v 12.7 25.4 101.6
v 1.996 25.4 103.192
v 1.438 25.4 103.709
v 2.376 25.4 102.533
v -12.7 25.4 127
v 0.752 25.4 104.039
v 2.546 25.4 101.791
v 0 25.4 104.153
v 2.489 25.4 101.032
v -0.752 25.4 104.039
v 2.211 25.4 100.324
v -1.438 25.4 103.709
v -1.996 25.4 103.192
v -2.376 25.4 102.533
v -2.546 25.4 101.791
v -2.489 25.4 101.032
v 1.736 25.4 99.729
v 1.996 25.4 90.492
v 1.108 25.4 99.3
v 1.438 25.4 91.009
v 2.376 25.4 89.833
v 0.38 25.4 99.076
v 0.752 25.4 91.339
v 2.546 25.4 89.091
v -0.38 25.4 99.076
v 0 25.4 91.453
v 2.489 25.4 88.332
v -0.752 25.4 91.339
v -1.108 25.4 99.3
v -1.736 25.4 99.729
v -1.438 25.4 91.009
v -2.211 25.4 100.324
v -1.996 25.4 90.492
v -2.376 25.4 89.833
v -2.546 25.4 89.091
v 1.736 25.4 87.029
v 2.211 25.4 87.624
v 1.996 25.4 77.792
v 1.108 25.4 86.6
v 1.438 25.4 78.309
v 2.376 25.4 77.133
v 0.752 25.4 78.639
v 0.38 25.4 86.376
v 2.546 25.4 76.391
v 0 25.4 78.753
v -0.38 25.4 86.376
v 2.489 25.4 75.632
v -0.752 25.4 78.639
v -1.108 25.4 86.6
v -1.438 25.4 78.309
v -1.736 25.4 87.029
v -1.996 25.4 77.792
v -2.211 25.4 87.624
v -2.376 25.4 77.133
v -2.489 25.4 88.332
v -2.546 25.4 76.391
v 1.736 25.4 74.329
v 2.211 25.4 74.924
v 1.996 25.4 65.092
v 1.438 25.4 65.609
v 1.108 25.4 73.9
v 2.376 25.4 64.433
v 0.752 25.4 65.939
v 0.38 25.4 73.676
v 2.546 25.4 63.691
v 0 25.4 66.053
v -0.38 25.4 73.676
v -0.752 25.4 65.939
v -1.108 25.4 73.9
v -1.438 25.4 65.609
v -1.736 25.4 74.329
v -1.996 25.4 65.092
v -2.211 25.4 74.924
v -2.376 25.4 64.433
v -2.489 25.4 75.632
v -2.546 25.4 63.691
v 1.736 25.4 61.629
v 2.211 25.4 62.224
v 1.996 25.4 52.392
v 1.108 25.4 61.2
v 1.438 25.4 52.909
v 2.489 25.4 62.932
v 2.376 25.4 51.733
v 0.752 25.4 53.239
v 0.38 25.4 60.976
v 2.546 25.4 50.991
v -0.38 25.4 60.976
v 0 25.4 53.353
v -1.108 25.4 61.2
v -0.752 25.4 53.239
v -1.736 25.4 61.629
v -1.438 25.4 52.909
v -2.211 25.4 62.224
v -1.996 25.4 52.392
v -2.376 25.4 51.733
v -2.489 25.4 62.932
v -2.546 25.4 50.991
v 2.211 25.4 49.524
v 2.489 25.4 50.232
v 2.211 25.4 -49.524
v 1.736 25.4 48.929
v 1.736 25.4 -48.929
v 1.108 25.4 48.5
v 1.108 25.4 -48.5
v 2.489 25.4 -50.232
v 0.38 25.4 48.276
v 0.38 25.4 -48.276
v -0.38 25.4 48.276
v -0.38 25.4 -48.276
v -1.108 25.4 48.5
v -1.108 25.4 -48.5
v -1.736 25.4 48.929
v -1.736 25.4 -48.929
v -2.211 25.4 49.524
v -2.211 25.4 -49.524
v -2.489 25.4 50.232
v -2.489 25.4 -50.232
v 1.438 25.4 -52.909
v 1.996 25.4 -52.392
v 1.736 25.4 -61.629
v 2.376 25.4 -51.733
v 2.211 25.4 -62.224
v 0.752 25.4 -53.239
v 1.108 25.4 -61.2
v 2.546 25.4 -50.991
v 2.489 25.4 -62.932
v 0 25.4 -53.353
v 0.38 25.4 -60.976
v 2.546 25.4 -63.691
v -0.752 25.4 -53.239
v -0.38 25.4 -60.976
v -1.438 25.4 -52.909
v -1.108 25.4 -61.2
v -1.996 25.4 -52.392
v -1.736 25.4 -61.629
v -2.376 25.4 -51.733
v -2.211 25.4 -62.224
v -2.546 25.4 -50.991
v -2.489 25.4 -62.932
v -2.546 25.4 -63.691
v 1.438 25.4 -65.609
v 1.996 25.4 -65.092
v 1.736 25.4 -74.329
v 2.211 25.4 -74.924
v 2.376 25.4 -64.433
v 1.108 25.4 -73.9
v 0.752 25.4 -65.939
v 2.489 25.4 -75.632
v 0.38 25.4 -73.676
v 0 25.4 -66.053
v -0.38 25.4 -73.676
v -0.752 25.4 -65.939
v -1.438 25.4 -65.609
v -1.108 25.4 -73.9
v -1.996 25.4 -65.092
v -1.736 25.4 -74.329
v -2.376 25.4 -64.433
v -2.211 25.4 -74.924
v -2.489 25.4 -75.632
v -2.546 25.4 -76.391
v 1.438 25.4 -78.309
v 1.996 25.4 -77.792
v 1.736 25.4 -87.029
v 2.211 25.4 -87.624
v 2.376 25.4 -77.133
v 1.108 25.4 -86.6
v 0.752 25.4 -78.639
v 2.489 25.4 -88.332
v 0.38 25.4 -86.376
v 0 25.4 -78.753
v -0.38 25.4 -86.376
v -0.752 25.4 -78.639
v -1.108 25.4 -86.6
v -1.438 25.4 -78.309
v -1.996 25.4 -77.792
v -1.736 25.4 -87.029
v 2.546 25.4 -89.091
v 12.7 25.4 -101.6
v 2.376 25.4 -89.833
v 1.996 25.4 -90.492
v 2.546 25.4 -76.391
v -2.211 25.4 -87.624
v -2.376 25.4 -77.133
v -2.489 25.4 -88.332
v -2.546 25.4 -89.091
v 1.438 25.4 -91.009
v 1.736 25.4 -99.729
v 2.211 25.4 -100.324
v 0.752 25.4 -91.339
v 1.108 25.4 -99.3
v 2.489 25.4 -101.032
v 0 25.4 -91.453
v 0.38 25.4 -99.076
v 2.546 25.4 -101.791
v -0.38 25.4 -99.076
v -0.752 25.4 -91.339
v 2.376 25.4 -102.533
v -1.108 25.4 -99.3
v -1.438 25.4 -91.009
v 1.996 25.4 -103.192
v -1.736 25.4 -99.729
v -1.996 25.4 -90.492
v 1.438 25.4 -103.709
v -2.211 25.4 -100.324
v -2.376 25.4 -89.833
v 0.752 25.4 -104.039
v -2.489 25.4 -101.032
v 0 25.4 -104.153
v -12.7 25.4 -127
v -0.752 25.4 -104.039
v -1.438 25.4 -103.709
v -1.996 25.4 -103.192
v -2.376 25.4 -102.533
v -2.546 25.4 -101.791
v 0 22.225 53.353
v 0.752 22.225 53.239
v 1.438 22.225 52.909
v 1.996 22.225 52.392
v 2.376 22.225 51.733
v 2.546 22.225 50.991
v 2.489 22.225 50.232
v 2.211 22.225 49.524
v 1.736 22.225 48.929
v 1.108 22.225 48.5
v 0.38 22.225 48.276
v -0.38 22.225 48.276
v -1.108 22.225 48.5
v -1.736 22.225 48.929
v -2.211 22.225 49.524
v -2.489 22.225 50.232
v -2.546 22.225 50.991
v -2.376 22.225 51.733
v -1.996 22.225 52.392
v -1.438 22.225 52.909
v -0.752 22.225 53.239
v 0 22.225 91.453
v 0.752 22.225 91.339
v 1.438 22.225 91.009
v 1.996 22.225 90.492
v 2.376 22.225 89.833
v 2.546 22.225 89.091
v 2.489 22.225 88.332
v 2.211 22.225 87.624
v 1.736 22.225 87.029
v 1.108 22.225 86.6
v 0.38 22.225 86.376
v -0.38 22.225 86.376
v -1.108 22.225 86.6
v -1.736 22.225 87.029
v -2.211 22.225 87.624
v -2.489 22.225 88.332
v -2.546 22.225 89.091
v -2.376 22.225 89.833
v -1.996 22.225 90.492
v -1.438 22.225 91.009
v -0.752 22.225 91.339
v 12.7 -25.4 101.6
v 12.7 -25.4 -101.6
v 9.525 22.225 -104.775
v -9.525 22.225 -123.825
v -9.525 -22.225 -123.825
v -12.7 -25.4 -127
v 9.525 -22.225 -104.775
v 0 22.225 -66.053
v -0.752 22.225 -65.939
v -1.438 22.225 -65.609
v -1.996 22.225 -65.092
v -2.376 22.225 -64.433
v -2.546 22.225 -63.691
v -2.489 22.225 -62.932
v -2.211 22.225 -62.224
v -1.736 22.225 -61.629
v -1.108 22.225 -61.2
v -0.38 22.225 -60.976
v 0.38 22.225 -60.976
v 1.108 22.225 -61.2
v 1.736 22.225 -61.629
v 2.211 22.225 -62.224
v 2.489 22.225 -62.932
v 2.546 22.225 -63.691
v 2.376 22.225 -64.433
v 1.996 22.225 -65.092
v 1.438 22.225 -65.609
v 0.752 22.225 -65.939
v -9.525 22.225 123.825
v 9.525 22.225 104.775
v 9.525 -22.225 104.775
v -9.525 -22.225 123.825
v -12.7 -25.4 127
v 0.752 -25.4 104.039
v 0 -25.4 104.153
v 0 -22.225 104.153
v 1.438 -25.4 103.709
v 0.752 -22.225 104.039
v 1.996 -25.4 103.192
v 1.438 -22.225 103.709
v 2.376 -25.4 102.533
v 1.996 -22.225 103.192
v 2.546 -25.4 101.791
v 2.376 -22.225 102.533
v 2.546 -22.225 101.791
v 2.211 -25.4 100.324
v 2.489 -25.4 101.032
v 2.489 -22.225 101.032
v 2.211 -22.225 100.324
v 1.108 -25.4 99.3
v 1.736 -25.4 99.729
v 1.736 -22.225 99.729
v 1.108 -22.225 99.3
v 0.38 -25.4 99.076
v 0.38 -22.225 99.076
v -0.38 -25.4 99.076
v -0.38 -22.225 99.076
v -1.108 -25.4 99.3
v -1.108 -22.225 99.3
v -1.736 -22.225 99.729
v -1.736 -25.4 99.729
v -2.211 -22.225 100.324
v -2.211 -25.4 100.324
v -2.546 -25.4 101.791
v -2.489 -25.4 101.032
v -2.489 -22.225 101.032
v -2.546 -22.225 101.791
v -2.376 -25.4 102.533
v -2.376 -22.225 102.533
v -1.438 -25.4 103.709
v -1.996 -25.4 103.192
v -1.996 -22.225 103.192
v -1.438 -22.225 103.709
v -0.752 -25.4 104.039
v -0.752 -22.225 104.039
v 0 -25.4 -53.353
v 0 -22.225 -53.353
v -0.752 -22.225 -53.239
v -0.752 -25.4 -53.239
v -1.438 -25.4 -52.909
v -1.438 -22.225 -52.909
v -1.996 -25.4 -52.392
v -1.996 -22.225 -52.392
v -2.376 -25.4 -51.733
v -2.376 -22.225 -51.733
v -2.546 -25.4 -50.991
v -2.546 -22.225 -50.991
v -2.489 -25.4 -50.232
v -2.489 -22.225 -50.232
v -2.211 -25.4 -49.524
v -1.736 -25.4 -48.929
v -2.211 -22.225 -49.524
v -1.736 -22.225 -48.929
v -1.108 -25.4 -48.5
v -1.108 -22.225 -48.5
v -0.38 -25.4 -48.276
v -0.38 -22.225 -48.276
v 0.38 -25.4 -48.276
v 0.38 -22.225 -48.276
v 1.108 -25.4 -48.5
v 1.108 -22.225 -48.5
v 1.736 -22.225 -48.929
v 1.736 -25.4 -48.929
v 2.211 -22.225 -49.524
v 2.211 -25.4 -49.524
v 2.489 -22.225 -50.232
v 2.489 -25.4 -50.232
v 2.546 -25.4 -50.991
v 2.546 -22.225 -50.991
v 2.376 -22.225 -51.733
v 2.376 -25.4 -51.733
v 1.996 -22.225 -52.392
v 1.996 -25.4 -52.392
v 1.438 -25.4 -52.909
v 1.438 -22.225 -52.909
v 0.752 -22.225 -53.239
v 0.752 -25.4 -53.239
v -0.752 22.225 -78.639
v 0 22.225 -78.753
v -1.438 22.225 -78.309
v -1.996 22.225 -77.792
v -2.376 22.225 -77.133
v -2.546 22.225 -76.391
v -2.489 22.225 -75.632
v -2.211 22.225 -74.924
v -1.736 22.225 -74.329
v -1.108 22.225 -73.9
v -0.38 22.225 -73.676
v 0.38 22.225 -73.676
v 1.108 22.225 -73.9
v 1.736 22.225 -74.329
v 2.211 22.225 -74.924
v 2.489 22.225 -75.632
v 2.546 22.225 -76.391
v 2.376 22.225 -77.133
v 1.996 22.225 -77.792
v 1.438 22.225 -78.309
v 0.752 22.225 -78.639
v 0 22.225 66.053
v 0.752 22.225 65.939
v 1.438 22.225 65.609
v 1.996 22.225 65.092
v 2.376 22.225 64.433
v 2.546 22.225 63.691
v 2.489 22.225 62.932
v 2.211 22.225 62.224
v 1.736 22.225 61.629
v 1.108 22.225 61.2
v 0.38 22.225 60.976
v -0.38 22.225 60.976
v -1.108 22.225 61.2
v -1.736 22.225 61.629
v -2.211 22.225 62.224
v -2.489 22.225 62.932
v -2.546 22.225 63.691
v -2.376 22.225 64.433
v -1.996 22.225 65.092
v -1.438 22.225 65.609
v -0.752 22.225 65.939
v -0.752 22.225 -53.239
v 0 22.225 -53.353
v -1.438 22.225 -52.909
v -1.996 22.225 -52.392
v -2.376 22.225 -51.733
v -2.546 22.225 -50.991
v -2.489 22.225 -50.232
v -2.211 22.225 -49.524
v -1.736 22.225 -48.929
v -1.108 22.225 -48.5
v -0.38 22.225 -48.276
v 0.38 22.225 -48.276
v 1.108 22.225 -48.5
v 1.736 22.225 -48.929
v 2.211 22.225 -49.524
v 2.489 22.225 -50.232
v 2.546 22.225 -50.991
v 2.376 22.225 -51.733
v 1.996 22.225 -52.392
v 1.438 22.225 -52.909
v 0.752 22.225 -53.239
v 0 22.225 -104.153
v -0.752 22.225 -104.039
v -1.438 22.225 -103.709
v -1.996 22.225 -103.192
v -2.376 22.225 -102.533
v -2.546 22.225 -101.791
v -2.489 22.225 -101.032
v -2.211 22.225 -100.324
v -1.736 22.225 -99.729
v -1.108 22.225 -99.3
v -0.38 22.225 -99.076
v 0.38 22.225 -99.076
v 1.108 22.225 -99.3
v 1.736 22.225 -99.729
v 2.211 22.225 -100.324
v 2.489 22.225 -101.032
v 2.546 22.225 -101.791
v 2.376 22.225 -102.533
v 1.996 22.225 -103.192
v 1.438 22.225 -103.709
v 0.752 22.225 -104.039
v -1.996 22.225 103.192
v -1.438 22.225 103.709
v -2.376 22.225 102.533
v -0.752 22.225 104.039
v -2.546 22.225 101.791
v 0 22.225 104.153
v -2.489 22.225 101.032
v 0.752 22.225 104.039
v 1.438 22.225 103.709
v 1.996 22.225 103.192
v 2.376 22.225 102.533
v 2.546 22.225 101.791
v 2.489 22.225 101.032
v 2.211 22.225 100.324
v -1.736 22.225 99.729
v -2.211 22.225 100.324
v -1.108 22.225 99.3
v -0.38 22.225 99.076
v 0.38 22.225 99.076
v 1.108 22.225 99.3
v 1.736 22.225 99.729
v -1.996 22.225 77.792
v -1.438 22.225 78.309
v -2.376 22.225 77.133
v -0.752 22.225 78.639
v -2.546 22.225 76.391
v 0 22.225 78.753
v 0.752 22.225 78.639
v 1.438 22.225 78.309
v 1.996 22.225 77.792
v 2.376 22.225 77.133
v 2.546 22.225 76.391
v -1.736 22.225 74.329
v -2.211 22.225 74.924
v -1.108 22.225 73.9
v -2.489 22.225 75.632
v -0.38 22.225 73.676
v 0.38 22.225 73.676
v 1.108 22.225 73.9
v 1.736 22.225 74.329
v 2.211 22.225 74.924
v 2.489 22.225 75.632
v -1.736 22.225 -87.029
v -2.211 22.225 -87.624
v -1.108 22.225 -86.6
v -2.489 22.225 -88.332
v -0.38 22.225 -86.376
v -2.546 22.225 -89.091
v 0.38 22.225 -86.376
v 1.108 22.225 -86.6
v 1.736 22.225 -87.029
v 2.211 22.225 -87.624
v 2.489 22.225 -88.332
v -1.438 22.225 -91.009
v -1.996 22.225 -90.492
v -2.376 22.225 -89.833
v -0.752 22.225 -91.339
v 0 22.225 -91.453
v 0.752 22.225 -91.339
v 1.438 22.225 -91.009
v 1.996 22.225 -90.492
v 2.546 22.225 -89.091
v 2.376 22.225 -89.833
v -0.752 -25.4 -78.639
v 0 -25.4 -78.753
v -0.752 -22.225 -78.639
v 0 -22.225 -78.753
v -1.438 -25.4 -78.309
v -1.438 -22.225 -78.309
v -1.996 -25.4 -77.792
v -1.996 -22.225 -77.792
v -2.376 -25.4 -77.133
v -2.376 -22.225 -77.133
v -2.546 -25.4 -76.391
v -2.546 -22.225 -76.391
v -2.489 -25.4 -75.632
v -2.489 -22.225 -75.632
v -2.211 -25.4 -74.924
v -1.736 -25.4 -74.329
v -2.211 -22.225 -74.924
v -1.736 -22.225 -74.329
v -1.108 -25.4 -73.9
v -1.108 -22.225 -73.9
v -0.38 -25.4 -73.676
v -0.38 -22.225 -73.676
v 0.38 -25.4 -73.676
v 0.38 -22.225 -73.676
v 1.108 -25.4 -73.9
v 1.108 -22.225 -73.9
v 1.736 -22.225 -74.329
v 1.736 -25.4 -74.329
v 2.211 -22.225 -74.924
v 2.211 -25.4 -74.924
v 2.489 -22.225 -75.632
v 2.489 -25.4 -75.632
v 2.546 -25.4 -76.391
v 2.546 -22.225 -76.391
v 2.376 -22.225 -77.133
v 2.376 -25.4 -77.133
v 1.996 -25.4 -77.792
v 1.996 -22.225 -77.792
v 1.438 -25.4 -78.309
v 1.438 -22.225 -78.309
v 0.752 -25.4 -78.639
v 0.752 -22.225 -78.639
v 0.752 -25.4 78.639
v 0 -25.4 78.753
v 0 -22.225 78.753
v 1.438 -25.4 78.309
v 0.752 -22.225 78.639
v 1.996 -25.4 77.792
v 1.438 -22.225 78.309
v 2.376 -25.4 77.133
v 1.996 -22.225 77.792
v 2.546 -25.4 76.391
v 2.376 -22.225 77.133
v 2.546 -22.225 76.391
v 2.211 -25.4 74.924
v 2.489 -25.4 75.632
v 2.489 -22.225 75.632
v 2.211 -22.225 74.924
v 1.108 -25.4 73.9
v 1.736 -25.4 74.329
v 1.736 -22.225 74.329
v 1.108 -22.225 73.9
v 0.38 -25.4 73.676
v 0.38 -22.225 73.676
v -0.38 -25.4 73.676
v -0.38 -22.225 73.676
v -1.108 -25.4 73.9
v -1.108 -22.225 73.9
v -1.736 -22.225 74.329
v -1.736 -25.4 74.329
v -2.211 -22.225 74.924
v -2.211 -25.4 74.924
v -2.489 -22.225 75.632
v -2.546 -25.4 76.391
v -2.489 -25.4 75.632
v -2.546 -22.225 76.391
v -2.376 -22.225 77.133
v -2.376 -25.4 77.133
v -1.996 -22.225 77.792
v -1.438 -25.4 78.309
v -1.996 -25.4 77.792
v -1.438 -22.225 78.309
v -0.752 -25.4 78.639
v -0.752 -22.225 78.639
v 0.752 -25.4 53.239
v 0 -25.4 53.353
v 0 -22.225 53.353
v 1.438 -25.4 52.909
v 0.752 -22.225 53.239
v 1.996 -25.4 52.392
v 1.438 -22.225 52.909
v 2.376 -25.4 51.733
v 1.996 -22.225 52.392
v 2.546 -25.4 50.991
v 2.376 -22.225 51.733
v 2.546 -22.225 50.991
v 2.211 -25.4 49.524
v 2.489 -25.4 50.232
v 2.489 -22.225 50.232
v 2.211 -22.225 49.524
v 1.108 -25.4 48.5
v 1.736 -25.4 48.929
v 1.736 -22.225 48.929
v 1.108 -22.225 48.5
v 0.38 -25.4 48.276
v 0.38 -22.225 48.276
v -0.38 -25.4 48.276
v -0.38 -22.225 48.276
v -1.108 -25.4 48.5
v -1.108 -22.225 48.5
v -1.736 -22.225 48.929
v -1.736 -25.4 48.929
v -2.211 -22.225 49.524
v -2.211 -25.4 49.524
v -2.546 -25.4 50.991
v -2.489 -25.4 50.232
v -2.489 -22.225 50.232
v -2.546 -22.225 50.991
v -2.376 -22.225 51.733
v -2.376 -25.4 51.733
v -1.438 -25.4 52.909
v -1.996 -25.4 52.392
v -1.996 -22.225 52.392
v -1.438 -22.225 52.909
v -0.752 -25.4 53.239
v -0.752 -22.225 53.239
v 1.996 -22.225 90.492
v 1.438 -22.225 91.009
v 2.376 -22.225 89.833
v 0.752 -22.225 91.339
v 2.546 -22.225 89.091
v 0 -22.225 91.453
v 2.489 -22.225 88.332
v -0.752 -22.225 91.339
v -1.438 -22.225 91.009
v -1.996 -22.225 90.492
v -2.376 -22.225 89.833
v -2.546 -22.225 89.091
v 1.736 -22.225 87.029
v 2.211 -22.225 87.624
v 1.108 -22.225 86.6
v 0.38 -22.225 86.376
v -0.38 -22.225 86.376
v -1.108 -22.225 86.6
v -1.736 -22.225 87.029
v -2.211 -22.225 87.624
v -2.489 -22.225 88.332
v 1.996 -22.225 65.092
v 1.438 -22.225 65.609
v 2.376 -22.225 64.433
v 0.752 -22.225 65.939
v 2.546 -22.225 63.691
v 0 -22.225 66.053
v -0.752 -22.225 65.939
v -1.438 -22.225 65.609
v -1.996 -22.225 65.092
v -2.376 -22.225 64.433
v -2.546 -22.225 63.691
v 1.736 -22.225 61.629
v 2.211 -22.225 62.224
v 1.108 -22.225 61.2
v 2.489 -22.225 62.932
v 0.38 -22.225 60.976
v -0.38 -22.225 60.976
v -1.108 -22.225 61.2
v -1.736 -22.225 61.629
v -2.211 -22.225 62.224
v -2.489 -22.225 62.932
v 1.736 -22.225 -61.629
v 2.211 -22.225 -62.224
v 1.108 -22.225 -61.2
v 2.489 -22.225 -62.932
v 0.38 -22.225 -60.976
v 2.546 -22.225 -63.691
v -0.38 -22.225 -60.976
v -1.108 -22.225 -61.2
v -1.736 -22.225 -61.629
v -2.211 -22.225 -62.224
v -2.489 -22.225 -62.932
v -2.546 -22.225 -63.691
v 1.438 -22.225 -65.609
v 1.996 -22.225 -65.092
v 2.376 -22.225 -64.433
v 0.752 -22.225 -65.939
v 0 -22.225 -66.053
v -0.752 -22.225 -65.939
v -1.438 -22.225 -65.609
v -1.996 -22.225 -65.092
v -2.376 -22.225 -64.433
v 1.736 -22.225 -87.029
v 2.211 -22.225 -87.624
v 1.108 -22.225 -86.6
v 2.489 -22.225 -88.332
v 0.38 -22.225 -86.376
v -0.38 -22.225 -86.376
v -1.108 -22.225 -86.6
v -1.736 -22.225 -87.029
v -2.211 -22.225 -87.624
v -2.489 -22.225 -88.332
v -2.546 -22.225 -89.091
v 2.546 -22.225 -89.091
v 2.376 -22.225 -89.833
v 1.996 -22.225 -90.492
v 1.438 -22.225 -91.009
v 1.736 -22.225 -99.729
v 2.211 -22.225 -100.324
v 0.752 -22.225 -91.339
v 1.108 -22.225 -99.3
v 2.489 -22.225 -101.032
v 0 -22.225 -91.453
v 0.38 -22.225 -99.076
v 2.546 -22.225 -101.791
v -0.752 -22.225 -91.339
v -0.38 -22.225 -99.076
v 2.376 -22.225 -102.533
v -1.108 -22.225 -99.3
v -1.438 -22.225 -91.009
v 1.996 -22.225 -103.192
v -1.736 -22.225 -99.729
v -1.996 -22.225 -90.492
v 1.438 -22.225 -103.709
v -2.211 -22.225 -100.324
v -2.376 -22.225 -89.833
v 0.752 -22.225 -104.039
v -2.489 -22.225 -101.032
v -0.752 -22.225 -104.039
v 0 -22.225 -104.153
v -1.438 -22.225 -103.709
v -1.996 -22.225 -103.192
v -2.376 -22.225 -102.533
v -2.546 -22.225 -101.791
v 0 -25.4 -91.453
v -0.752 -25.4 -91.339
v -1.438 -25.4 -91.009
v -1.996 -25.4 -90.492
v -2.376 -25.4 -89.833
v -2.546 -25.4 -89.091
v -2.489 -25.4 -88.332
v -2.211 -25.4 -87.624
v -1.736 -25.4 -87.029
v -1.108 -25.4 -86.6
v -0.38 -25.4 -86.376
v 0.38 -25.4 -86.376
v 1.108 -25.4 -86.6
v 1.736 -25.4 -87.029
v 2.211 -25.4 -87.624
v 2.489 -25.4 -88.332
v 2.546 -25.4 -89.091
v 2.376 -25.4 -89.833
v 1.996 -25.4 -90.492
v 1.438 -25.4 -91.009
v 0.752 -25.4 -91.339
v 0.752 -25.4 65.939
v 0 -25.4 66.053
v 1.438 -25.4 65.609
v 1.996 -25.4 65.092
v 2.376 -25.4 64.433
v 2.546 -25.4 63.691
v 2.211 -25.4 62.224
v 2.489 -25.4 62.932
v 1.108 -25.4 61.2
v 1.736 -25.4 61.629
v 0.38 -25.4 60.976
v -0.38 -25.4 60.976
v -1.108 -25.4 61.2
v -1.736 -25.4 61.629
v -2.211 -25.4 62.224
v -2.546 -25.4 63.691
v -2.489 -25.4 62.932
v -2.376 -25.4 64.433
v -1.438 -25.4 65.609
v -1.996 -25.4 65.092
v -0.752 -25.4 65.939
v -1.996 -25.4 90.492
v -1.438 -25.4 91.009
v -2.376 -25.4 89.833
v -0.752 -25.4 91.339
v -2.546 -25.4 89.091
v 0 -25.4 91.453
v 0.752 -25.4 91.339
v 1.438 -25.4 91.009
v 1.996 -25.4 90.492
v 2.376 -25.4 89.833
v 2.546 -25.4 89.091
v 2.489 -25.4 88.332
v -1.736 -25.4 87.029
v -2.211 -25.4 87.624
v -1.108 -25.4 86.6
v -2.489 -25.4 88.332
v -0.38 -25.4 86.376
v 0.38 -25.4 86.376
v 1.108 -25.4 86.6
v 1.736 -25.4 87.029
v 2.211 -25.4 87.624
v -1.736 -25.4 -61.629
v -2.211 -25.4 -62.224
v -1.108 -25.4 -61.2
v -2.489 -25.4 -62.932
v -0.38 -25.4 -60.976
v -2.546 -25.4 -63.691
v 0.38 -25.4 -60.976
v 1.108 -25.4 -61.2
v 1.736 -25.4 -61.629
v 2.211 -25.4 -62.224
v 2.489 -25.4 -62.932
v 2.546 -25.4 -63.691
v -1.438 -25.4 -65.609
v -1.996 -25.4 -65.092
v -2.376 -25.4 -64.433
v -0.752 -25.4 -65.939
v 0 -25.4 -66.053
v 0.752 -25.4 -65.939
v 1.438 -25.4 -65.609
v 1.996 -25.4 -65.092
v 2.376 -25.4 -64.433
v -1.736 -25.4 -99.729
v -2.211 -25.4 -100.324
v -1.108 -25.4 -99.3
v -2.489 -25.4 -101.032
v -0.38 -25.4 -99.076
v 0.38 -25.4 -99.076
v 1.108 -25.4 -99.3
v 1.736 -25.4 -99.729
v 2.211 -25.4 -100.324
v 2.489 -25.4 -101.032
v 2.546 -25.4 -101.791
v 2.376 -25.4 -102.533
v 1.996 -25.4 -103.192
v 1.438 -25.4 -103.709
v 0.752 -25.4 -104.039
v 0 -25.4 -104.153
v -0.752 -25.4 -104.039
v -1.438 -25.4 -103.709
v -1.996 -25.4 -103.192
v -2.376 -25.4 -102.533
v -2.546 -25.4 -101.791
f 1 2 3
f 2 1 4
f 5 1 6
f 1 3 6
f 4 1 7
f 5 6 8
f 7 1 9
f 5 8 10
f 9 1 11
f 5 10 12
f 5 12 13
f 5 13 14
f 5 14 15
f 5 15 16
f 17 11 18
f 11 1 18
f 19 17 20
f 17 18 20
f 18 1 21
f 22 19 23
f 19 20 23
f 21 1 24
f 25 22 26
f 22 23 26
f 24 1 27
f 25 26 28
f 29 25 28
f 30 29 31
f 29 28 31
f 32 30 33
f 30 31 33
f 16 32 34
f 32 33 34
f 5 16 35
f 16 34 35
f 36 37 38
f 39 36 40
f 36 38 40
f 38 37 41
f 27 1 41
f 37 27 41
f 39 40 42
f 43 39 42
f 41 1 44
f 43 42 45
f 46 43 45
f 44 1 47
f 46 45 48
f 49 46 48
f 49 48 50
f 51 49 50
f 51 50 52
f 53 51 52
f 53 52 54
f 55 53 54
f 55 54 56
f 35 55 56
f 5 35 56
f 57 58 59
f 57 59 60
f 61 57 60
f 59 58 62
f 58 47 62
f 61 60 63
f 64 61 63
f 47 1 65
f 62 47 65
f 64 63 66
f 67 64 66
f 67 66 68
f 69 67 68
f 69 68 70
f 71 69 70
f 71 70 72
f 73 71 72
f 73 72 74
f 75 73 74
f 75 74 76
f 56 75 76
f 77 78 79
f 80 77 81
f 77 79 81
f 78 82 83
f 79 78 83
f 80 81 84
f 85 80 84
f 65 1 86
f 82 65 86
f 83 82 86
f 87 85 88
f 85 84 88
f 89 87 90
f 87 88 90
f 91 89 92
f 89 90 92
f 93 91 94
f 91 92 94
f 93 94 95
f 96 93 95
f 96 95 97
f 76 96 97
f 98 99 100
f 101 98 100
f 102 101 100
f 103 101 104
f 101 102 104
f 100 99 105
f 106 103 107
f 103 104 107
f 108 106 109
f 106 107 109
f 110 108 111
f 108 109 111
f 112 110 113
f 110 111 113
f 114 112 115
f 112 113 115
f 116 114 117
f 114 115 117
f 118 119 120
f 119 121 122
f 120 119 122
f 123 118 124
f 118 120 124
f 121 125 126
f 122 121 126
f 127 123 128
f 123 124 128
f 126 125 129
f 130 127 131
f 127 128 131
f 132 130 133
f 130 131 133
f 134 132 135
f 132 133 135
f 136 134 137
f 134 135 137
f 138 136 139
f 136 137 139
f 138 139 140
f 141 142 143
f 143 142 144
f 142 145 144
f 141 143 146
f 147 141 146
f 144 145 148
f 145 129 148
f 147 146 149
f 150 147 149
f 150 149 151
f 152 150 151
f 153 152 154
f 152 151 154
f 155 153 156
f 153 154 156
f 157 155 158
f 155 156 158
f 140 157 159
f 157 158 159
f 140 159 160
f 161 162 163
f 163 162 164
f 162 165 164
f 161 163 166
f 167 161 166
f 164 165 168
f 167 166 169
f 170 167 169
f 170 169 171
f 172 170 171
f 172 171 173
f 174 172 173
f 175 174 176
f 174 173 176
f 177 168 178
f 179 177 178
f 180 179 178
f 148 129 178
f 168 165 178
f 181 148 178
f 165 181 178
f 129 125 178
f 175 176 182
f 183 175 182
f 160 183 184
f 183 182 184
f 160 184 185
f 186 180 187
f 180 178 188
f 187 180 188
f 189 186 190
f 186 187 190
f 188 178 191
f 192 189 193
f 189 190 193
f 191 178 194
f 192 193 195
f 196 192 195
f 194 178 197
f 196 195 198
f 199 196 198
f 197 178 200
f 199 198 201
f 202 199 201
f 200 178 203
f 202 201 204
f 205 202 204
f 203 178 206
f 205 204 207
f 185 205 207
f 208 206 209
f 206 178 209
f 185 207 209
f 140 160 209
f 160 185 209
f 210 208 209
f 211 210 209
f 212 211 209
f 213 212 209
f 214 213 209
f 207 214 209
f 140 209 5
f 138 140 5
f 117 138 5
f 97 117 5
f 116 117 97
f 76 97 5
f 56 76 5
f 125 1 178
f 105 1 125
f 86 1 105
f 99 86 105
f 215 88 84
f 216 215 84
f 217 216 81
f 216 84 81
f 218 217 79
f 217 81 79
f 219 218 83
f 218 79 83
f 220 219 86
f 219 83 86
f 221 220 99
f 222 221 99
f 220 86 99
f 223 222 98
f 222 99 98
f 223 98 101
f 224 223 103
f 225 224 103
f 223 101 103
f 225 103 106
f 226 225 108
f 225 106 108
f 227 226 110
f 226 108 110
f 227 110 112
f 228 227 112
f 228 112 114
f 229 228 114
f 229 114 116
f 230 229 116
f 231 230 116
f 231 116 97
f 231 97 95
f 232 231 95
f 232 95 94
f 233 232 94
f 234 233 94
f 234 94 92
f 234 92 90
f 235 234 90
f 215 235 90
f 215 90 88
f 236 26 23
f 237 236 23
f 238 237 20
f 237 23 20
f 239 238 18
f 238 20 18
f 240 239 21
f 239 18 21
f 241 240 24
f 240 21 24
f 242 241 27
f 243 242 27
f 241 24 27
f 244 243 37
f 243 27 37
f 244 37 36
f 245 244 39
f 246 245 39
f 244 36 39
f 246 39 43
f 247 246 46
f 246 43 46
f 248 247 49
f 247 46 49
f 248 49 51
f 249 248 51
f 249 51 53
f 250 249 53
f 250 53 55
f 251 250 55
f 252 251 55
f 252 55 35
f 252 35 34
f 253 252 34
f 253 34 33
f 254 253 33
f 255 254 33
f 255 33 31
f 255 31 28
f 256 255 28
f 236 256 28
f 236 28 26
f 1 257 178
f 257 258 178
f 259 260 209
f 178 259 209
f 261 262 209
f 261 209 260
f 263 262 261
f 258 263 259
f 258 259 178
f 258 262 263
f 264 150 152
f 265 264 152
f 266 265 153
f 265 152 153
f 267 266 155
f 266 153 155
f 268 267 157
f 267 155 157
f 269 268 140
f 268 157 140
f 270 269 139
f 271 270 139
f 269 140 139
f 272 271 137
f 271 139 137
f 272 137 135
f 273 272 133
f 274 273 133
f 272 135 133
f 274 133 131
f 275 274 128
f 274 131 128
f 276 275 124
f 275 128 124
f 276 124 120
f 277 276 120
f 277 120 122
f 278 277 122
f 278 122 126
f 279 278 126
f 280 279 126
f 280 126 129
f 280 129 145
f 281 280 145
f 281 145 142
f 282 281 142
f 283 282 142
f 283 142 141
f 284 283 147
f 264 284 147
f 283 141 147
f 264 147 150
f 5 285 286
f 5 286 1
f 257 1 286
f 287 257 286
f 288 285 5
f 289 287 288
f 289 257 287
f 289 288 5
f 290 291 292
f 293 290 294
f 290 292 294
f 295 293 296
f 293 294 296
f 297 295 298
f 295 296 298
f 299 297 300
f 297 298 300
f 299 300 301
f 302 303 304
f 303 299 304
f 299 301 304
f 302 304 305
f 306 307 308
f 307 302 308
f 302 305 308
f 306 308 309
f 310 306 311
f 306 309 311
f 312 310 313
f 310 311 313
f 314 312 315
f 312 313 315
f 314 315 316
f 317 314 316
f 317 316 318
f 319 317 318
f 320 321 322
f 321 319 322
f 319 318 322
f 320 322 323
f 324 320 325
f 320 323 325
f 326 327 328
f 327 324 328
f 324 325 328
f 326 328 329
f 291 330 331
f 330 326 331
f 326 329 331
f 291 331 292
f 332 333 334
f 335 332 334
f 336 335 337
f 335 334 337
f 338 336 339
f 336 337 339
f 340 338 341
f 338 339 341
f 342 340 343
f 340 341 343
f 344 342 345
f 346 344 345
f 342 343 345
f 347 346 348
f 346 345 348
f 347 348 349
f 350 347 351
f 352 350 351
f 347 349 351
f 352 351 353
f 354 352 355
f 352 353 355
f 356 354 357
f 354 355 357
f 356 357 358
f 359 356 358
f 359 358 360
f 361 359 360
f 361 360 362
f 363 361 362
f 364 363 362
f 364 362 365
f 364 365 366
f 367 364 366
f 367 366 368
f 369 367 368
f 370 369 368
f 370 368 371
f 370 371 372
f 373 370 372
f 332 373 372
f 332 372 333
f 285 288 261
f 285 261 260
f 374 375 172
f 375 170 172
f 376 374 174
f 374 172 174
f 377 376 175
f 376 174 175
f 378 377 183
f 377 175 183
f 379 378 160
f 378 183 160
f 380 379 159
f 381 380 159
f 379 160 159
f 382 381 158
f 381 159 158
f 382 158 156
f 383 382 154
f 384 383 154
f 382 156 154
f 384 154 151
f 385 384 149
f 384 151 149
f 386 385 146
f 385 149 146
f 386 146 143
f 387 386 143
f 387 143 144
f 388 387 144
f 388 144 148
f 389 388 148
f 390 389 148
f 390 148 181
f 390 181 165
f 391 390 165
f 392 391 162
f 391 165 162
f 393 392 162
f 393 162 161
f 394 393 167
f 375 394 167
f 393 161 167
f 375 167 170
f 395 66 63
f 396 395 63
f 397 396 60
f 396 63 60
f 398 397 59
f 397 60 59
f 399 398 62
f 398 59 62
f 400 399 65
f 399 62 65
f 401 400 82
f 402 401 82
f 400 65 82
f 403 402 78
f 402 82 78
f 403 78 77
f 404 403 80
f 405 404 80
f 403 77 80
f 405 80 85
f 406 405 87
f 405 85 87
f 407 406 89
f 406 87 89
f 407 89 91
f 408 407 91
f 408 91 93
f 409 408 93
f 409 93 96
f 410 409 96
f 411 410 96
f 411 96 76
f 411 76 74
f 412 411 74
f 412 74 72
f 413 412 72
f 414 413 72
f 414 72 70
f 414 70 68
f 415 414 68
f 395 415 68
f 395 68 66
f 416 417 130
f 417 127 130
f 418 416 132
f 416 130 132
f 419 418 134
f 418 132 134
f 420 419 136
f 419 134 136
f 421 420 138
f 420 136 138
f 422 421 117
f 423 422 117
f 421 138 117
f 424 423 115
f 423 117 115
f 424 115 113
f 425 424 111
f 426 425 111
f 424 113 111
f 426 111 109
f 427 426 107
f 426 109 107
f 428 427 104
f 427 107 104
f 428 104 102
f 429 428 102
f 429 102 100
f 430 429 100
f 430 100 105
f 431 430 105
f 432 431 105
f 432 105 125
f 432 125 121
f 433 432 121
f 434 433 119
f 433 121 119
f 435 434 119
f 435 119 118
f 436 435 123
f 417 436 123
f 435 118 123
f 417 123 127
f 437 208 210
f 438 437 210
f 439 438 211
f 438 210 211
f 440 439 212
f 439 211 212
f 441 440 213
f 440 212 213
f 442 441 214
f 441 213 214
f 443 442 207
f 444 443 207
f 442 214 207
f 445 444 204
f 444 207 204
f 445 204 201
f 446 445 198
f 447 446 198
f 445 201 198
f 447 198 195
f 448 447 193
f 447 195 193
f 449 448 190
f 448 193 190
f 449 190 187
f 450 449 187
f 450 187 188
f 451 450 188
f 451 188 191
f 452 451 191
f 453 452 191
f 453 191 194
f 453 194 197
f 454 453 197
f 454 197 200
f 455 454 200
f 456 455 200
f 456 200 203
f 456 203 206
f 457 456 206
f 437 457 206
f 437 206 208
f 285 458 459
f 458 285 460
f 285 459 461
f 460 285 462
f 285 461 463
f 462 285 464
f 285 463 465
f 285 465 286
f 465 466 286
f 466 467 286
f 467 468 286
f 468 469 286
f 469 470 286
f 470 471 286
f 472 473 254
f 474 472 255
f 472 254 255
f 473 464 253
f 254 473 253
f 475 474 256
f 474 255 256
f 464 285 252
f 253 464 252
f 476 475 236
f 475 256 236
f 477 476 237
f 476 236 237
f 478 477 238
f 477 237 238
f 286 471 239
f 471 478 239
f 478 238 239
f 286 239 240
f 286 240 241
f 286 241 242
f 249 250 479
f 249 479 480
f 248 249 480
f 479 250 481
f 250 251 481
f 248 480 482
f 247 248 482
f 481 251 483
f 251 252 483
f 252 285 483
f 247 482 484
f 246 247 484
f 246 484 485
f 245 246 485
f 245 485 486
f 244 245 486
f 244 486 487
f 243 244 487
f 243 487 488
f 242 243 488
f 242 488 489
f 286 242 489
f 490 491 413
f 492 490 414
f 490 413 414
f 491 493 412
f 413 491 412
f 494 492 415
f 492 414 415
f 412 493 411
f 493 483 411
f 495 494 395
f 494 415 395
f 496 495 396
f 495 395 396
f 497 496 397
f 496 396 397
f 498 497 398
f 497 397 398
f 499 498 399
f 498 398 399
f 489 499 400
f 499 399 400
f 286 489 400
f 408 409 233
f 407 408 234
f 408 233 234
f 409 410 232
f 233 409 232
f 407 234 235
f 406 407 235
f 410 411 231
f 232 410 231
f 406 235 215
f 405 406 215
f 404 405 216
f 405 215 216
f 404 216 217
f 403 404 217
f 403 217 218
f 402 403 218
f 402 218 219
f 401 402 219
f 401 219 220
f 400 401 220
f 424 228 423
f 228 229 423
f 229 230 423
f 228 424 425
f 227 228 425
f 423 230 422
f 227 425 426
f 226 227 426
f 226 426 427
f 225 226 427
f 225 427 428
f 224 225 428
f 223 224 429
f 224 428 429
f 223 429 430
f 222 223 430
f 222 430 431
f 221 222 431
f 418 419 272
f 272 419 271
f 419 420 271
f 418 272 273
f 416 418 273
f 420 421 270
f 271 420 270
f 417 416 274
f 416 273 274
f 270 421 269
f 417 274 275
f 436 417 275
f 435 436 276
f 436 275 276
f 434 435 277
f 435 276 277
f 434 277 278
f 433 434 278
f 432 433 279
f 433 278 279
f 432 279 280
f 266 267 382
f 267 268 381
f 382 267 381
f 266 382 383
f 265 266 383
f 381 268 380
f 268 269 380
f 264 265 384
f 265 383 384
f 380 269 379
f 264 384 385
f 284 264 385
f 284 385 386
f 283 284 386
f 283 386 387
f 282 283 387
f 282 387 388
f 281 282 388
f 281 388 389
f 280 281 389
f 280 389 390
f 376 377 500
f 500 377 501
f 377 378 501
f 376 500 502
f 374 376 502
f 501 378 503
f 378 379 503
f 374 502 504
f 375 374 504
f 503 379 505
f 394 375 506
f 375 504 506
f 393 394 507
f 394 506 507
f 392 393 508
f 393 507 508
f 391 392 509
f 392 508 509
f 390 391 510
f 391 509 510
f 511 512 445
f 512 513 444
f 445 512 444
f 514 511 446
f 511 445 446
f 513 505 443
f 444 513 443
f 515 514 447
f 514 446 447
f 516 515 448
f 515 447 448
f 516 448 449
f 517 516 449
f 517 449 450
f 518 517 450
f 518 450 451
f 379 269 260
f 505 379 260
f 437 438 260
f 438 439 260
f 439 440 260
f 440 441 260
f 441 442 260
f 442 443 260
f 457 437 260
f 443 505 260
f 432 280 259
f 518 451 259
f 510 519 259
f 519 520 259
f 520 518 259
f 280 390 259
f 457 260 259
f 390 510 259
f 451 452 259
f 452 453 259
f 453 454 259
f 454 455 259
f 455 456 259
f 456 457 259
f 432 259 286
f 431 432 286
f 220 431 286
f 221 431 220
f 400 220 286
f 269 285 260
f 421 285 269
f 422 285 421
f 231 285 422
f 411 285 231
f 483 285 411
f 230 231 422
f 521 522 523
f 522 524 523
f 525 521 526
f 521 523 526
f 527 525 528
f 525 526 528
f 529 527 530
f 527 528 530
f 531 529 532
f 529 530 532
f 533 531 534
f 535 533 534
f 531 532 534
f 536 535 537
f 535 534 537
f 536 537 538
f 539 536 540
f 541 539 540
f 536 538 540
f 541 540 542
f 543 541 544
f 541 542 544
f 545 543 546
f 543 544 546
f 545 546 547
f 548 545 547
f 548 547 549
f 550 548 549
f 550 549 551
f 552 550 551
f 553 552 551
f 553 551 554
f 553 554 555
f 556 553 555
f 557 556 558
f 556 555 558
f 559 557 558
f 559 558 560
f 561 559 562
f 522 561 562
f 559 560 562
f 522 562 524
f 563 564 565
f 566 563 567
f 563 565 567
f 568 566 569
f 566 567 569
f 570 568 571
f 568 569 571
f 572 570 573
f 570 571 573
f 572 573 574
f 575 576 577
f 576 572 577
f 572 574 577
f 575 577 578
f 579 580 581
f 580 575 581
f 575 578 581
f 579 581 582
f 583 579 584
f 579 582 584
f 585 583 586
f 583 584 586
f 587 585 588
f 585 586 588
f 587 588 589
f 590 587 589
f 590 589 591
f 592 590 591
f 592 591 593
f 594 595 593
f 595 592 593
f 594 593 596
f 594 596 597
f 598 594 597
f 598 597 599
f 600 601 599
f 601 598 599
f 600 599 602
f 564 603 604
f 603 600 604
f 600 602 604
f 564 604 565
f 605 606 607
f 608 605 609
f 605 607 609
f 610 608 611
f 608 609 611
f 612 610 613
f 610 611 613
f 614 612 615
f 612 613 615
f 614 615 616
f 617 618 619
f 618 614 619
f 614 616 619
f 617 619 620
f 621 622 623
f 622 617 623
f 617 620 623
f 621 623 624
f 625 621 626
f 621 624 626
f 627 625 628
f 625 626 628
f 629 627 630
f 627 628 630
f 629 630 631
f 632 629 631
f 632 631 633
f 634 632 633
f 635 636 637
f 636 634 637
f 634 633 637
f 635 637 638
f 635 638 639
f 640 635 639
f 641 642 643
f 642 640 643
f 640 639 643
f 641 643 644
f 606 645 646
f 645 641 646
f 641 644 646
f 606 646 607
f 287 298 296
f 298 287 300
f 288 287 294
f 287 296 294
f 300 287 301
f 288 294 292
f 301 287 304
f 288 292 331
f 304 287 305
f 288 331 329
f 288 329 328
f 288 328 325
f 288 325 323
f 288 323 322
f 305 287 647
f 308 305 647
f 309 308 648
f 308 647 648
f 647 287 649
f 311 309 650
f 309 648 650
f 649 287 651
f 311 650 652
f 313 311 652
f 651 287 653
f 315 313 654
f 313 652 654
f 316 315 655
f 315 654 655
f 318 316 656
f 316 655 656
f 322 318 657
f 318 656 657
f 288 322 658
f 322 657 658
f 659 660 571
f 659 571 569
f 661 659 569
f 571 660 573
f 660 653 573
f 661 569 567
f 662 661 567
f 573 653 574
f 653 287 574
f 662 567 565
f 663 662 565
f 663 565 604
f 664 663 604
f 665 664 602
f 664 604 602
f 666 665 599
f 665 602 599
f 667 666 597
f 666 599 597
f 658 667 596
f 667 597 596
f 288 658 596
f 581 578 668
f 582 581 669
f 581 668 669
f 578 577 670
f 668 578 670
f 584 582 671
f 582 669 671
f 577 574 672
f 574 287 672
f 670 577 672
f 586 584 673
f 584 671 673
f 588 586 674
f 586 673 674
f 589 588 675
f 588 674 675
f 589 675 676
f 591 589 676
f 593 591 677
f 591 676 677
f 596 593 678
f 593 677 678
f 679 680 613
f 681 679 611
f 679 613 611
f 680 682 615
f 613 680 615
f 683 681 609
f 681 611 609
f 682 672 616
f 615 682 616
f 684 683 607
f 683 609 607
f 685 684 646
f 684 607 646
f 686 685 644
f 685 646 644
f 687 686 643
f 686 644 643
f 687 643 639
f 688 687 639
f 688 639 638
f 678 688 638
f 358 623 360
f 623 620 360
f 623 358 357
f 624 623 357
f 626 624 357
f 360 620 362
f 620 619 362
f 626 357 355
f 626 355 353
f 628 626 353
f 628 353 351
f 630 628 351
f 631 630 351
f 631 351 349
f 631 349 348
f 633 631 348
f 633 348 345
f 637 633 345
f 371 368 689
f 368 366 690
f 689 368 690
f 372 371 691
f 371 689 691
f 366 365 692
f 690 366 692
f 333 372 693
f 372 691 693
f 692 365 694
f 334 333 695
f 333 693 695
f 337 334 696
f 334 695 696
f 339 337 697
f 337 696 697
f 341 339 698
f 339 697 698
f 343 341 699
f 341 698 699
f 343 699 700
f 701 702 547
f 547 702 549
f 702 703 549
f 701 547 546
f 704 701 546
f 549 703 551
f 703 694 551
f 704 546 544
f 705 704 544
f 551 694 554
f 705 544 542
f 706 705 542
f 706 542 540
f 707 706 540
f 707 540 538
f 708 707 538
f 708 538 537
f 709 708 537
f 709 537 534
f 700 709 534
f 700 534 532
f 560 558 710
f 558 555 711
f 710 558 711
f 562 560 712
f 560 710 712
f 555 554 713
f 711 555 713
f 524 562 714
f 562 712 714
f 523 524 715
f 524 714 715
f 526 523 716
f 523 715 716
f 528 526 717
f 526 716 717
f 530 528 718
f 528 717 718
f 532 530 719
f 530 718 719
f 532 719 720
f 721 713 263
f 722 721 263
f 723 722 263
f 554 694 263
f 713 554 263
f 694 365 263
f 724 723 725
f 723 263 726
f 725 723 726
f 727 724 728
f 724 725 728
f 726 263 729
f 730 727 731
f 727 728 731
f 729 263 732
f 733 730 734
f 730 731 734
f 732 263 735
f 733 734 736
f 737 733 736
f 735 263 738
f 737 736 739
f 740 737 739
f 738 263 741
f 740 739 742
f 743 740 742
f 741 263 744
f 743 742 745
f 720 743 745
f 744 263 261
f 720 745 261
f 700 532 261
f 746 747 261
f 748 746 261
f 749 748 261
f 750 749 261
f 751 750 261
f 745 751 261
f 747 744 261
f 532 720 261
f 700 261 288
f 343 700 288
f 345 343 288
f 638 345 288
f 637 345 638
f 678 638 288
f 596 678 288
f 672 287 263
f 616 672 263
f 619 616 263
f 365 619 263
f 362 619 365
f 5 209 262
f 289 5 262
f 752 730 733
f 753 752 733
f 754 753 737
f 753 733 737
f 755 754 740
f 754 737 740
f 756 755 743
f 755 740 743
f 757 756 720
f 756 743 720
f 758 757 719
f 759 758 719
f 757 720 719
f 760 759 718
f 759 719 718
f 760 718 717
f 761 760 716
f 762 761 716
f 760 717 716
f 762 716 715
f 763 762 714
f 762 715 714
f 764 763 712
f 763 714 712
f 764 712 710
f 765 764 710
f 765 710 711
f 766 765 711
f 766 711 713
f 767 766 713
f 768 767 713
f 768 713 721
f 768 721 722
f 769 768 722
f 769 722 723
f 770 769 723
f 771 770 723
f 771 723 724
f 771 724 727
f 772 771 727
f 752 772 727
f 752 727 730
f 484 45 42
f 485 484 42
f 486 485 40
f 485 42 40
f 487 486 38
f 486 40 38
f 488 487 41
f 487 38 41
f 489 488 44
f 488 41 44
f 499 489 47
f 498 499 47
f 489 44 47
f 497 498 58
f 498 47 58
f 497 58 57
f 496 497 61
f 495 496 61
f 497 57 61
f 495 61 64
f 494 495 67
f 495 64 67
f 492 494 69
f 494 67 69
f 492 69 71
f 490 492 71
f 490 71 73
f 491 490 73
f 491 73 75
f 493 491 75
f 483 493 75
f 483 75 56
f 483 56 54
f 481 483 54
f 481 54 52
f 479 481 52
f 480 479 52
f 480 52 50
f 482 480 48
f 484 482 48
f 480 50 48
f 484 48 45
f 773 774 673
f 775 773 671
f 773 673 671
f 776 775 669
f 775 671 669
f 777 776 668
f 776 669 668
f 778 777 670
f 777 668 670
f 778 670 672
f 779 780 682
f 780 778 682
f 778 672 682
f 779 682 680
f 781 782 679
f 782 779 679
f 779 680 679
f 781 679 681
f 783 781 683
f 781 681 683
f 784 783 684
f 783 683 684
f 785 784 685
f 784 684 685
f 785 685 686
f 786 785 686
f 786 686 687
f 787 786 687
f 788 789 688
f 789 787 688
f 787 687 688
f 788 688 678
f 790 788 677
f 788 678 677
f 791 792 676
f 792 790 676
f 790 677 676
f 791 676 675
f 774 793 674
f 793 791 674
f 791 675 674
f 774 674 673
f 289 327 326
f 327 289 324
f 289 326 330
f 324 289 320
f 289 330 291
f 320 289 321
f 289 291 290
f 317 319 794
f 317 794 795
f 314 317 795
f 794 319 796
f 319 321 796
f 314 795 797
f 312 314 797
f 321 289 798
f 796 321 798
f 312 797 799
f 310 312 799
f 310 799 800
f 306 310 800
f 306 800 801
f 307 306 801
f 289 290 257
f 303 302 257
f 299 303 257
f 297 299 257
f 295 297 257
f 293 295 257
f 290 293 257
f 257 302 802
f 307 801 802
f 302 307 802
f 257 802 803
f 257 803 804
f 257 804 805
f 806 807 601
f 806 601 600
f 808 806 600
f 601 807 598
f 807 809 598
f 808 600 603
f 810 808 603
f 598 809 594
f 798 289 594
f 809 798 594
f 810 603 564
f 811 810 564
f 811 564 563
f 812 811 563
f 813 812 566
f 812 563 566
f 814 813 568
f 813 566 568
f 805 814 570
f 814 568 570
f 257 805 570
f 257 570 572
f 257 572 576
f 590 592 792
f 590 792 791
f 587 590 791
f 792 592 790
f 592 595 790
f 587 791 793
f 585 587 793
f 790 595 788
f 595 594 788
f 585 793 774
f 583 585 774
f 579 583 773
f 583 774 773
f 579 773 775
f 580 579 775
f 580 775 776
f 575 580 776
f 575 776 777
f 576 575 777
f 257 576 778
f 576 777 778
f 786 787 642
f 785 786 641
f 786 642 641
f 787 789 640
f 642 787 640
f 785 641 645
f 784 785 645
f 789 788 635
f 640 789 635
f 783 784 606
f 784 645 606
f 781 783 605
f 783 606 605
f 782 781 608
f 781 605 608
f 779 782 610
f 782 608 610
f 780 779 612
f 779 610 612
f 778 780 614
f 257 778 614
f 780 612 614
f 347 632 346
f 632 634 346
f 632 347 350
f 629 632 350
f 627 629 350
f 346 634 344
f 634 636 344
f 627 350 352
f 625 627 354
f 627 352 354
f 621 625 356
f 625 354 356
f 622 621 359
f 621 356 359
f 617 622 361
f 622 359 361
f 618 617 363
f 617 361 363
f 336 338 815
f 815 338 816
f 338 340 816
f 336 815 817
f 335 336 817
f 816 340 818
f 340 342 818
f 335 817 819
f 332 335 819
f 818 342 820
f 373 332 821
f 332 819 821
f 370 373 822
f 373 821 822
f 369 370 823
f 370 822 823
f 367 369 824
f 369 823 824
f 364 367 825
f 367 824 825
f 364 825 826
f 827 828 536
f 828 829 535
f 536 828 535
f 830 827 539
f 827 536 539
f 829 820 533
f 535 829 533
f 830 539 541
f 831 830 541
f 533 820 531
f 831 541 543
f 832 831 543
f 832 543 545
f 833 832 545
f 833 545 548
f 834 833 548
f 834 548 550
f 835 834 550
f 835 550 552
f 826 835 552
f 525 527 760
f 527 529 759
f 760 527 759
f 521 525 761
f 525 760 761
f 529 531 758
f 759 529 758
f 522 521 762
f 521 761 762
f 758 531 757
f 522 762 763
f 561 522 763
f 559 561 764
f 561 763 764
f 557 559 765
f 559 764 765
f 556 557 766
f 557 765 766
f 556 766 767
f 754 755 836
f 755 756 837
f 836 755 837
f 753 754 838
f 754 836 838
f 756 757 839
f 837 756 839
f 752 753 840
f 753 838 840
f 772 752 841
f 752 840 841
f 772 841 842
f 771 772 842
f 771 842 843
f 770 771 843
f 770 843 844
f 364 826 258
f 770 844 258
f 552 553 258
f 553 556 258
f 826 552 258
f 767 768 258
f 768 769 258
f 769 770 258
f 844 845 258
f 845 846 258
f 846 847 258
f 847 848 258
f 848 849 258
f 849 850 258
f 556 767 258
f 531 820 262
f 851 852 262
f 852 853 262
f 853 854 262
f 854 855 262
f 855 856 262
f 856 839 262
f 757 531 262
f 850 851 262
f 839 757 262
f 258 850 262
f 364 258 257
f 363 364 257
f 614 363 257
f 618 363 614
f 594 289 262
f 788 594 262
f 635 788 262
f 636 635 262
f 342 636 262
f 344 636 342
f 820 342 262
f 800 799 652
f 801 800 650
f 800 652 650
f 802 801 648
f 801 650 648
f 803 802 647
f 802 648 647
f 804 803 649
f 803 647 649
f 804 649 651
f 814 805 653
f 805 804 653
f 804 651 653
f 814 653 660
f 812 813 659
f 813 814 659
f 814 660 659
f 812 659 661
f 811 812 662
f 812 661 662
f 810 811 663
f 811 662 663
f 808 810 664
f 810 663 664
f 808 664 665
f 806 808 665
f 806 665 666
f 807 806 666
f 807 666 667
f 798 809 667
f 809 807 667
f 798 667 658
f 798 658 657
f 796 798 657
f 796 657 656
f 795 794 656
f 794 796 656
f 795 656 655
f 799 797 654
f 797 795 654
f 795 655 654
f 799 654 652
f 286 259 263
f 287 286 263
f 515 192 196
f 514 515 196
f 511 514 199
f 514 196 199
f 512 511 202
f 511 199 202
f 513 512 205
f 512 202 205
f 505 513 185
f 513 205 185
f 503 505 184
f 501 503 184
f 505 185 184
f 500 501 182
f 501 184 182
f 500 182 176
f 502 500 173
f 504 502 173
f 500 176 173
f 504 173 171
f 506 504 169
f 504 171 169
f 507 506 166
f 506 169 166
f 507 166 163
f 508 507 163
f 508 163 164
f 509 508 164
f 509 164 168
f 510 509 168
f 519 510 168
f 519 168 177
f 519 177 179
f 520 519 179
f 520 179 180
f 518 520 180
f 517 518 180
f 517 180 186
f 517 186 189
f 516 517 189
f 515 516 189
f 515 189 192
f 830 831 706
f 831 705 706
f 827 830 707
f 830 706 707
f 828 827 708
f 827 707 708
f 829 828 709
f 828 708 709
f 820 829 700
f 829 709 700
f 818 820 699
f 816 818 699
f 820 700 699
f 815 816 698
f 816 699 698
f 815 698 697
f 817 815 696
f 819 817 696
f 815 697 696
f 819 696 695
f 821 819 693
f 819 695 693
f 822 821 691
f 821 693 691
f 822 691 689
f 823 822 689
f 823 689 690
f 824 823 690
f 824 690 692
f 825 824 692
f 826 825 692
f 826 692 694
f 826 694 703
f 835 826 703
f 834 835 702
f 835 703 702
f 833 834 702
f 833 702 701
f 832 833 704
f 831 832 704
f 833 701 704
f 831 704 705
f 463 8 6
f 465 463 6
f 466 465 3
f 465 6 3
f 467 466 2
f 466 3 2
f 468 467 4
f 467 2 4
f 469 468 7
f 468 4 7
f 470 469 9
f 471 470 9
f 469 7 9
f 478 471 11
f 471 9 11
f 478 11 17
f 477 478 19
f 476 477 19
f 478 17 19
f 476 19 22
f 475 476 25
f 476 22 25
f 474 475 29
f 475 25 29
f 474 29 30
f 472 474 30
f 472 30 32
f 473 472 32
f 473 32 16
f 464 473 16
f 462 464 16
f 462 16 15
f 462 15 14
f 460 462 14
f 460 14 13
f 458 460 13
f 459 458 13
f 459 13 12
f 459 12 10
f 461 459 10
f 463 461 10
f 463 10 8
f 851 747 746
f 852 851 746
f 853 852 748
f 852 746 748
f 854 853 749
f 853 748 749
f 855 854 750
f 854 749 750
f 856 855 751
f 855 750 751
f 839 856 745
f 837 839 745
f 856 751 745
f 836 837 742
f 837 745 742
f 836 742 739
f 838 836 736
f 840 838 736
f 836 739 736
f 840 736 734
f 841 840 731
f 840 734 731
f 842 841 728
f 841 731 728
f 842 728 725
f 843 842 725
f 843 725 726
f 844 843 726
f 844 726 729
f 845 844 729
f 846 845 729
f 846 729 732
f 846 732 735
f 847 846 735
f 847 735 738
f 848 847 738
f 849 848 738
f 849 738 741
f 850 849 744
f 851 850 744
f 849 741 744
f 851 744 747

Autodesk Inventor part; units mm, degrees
ref_plane "YZ Plane" through (0, 0, 0) normal (1, 0, 0) x (0, 1, 0)
ref_plane "XZ Plane" through (0, 0, 0) normal (0, 1, 0) x (-1, 0, 0)
ref_plane "XY Plane" through (0, 0, 0) normal (0, 0, 1) x (1, 0, 0)
sketch "Sketch1" plane through (0, 0, 0) normal (0, 0, 1) x (1, 0, 0)
  line L0 (-12.7, -25.4) -> (12.7, -25.4)
  line L1 (12.7, -25.4) -> (12.7, 25.4)
  line L2 (12.7, 25.4) -> (-12.7, 25.4)
  line L3 (-12.7, 25.4) -> (-12.7, -25.4)
  line L4 (-12.7, -25.4) -> (12.7, 25.4) construction
  line L5 (12.7, -25.4) -> (-12.7, 25.4) construction
  line L6 (-9.525, 22.225) -> (9.525, 22.225)
  line L7 (9.525, 22.225) -> (9.525, -22.225)
  line L8 (9.525, -22.225) -> (-9.525, -22.225)
  line L9 (-9.525, -22.225) -> (-9.525, 22.225)
  point P0 (0, 0)
  dimension "d0" = 25.4
  dimension "d1" = 50.8
  dimension "d2" = 3.175
extrude "Extrusion1" add sketch "Sketch1" along normal mid plane 254
sketch "Sketch2" plane through (-12.7, -25.4, 127) normal (0, -1, 0) x (1, 0, 0)
  line L0 (25.4, 0) -> (25.4, -254) projected
  line L1 (0, 0) -> (25.4, 0) construction
  line L2 (0, -254) -> (0, 0) construction
  line L3 (25.4, -254) -> (0, -254) projected
  line L4 (0, -254) -> (25.4, -228.6)
  point P0 (12.7, -127)
  dimension "d6" = 45
extrude "Extrusion2" cut sketch "Sketch2" against normal through all
sketch "Sketch4" plane through (-12.7, -25.4, 127) normal (0, -1, 0) x (1, 0, 0)
  line L0 (0, -254) -> (0, 0) construction
  point P0 (12.7, -127)
  point P1 (12.7, -228.6)
  point P2 (12.7, -215.9)
  point P3 (12.7, -203.2)
  point P4 (12.7, -190.5)
  point P5 (12.7, -177.8)
  dimension "d9" = 12.7
  dimension "d10" = 25.4
  dimension "d13" = 12.7
hole "Hole1" at (0, -25.4, -101.6) at (0, -25.4, -88.9) at (0, -25.4, -76.2) at (0, -25.4, -63.5) at (0, -25.4, -50.8) direction (0, 1, 0) diameter 5.1054 end through all clearance for "Flat Head Machine Screw (82)" size "#10" standard "Ansi Unified Screw Threads"
mirror "Mirror1" about plane through (0, 0, 0) normal (0, 0, 1) of "Hole1", "Extrusion2"
properties part number "TUBE,ELEVATOR,BOT,STAGE1" material "Aluminum 6061 T6 0 Cold Formed"
